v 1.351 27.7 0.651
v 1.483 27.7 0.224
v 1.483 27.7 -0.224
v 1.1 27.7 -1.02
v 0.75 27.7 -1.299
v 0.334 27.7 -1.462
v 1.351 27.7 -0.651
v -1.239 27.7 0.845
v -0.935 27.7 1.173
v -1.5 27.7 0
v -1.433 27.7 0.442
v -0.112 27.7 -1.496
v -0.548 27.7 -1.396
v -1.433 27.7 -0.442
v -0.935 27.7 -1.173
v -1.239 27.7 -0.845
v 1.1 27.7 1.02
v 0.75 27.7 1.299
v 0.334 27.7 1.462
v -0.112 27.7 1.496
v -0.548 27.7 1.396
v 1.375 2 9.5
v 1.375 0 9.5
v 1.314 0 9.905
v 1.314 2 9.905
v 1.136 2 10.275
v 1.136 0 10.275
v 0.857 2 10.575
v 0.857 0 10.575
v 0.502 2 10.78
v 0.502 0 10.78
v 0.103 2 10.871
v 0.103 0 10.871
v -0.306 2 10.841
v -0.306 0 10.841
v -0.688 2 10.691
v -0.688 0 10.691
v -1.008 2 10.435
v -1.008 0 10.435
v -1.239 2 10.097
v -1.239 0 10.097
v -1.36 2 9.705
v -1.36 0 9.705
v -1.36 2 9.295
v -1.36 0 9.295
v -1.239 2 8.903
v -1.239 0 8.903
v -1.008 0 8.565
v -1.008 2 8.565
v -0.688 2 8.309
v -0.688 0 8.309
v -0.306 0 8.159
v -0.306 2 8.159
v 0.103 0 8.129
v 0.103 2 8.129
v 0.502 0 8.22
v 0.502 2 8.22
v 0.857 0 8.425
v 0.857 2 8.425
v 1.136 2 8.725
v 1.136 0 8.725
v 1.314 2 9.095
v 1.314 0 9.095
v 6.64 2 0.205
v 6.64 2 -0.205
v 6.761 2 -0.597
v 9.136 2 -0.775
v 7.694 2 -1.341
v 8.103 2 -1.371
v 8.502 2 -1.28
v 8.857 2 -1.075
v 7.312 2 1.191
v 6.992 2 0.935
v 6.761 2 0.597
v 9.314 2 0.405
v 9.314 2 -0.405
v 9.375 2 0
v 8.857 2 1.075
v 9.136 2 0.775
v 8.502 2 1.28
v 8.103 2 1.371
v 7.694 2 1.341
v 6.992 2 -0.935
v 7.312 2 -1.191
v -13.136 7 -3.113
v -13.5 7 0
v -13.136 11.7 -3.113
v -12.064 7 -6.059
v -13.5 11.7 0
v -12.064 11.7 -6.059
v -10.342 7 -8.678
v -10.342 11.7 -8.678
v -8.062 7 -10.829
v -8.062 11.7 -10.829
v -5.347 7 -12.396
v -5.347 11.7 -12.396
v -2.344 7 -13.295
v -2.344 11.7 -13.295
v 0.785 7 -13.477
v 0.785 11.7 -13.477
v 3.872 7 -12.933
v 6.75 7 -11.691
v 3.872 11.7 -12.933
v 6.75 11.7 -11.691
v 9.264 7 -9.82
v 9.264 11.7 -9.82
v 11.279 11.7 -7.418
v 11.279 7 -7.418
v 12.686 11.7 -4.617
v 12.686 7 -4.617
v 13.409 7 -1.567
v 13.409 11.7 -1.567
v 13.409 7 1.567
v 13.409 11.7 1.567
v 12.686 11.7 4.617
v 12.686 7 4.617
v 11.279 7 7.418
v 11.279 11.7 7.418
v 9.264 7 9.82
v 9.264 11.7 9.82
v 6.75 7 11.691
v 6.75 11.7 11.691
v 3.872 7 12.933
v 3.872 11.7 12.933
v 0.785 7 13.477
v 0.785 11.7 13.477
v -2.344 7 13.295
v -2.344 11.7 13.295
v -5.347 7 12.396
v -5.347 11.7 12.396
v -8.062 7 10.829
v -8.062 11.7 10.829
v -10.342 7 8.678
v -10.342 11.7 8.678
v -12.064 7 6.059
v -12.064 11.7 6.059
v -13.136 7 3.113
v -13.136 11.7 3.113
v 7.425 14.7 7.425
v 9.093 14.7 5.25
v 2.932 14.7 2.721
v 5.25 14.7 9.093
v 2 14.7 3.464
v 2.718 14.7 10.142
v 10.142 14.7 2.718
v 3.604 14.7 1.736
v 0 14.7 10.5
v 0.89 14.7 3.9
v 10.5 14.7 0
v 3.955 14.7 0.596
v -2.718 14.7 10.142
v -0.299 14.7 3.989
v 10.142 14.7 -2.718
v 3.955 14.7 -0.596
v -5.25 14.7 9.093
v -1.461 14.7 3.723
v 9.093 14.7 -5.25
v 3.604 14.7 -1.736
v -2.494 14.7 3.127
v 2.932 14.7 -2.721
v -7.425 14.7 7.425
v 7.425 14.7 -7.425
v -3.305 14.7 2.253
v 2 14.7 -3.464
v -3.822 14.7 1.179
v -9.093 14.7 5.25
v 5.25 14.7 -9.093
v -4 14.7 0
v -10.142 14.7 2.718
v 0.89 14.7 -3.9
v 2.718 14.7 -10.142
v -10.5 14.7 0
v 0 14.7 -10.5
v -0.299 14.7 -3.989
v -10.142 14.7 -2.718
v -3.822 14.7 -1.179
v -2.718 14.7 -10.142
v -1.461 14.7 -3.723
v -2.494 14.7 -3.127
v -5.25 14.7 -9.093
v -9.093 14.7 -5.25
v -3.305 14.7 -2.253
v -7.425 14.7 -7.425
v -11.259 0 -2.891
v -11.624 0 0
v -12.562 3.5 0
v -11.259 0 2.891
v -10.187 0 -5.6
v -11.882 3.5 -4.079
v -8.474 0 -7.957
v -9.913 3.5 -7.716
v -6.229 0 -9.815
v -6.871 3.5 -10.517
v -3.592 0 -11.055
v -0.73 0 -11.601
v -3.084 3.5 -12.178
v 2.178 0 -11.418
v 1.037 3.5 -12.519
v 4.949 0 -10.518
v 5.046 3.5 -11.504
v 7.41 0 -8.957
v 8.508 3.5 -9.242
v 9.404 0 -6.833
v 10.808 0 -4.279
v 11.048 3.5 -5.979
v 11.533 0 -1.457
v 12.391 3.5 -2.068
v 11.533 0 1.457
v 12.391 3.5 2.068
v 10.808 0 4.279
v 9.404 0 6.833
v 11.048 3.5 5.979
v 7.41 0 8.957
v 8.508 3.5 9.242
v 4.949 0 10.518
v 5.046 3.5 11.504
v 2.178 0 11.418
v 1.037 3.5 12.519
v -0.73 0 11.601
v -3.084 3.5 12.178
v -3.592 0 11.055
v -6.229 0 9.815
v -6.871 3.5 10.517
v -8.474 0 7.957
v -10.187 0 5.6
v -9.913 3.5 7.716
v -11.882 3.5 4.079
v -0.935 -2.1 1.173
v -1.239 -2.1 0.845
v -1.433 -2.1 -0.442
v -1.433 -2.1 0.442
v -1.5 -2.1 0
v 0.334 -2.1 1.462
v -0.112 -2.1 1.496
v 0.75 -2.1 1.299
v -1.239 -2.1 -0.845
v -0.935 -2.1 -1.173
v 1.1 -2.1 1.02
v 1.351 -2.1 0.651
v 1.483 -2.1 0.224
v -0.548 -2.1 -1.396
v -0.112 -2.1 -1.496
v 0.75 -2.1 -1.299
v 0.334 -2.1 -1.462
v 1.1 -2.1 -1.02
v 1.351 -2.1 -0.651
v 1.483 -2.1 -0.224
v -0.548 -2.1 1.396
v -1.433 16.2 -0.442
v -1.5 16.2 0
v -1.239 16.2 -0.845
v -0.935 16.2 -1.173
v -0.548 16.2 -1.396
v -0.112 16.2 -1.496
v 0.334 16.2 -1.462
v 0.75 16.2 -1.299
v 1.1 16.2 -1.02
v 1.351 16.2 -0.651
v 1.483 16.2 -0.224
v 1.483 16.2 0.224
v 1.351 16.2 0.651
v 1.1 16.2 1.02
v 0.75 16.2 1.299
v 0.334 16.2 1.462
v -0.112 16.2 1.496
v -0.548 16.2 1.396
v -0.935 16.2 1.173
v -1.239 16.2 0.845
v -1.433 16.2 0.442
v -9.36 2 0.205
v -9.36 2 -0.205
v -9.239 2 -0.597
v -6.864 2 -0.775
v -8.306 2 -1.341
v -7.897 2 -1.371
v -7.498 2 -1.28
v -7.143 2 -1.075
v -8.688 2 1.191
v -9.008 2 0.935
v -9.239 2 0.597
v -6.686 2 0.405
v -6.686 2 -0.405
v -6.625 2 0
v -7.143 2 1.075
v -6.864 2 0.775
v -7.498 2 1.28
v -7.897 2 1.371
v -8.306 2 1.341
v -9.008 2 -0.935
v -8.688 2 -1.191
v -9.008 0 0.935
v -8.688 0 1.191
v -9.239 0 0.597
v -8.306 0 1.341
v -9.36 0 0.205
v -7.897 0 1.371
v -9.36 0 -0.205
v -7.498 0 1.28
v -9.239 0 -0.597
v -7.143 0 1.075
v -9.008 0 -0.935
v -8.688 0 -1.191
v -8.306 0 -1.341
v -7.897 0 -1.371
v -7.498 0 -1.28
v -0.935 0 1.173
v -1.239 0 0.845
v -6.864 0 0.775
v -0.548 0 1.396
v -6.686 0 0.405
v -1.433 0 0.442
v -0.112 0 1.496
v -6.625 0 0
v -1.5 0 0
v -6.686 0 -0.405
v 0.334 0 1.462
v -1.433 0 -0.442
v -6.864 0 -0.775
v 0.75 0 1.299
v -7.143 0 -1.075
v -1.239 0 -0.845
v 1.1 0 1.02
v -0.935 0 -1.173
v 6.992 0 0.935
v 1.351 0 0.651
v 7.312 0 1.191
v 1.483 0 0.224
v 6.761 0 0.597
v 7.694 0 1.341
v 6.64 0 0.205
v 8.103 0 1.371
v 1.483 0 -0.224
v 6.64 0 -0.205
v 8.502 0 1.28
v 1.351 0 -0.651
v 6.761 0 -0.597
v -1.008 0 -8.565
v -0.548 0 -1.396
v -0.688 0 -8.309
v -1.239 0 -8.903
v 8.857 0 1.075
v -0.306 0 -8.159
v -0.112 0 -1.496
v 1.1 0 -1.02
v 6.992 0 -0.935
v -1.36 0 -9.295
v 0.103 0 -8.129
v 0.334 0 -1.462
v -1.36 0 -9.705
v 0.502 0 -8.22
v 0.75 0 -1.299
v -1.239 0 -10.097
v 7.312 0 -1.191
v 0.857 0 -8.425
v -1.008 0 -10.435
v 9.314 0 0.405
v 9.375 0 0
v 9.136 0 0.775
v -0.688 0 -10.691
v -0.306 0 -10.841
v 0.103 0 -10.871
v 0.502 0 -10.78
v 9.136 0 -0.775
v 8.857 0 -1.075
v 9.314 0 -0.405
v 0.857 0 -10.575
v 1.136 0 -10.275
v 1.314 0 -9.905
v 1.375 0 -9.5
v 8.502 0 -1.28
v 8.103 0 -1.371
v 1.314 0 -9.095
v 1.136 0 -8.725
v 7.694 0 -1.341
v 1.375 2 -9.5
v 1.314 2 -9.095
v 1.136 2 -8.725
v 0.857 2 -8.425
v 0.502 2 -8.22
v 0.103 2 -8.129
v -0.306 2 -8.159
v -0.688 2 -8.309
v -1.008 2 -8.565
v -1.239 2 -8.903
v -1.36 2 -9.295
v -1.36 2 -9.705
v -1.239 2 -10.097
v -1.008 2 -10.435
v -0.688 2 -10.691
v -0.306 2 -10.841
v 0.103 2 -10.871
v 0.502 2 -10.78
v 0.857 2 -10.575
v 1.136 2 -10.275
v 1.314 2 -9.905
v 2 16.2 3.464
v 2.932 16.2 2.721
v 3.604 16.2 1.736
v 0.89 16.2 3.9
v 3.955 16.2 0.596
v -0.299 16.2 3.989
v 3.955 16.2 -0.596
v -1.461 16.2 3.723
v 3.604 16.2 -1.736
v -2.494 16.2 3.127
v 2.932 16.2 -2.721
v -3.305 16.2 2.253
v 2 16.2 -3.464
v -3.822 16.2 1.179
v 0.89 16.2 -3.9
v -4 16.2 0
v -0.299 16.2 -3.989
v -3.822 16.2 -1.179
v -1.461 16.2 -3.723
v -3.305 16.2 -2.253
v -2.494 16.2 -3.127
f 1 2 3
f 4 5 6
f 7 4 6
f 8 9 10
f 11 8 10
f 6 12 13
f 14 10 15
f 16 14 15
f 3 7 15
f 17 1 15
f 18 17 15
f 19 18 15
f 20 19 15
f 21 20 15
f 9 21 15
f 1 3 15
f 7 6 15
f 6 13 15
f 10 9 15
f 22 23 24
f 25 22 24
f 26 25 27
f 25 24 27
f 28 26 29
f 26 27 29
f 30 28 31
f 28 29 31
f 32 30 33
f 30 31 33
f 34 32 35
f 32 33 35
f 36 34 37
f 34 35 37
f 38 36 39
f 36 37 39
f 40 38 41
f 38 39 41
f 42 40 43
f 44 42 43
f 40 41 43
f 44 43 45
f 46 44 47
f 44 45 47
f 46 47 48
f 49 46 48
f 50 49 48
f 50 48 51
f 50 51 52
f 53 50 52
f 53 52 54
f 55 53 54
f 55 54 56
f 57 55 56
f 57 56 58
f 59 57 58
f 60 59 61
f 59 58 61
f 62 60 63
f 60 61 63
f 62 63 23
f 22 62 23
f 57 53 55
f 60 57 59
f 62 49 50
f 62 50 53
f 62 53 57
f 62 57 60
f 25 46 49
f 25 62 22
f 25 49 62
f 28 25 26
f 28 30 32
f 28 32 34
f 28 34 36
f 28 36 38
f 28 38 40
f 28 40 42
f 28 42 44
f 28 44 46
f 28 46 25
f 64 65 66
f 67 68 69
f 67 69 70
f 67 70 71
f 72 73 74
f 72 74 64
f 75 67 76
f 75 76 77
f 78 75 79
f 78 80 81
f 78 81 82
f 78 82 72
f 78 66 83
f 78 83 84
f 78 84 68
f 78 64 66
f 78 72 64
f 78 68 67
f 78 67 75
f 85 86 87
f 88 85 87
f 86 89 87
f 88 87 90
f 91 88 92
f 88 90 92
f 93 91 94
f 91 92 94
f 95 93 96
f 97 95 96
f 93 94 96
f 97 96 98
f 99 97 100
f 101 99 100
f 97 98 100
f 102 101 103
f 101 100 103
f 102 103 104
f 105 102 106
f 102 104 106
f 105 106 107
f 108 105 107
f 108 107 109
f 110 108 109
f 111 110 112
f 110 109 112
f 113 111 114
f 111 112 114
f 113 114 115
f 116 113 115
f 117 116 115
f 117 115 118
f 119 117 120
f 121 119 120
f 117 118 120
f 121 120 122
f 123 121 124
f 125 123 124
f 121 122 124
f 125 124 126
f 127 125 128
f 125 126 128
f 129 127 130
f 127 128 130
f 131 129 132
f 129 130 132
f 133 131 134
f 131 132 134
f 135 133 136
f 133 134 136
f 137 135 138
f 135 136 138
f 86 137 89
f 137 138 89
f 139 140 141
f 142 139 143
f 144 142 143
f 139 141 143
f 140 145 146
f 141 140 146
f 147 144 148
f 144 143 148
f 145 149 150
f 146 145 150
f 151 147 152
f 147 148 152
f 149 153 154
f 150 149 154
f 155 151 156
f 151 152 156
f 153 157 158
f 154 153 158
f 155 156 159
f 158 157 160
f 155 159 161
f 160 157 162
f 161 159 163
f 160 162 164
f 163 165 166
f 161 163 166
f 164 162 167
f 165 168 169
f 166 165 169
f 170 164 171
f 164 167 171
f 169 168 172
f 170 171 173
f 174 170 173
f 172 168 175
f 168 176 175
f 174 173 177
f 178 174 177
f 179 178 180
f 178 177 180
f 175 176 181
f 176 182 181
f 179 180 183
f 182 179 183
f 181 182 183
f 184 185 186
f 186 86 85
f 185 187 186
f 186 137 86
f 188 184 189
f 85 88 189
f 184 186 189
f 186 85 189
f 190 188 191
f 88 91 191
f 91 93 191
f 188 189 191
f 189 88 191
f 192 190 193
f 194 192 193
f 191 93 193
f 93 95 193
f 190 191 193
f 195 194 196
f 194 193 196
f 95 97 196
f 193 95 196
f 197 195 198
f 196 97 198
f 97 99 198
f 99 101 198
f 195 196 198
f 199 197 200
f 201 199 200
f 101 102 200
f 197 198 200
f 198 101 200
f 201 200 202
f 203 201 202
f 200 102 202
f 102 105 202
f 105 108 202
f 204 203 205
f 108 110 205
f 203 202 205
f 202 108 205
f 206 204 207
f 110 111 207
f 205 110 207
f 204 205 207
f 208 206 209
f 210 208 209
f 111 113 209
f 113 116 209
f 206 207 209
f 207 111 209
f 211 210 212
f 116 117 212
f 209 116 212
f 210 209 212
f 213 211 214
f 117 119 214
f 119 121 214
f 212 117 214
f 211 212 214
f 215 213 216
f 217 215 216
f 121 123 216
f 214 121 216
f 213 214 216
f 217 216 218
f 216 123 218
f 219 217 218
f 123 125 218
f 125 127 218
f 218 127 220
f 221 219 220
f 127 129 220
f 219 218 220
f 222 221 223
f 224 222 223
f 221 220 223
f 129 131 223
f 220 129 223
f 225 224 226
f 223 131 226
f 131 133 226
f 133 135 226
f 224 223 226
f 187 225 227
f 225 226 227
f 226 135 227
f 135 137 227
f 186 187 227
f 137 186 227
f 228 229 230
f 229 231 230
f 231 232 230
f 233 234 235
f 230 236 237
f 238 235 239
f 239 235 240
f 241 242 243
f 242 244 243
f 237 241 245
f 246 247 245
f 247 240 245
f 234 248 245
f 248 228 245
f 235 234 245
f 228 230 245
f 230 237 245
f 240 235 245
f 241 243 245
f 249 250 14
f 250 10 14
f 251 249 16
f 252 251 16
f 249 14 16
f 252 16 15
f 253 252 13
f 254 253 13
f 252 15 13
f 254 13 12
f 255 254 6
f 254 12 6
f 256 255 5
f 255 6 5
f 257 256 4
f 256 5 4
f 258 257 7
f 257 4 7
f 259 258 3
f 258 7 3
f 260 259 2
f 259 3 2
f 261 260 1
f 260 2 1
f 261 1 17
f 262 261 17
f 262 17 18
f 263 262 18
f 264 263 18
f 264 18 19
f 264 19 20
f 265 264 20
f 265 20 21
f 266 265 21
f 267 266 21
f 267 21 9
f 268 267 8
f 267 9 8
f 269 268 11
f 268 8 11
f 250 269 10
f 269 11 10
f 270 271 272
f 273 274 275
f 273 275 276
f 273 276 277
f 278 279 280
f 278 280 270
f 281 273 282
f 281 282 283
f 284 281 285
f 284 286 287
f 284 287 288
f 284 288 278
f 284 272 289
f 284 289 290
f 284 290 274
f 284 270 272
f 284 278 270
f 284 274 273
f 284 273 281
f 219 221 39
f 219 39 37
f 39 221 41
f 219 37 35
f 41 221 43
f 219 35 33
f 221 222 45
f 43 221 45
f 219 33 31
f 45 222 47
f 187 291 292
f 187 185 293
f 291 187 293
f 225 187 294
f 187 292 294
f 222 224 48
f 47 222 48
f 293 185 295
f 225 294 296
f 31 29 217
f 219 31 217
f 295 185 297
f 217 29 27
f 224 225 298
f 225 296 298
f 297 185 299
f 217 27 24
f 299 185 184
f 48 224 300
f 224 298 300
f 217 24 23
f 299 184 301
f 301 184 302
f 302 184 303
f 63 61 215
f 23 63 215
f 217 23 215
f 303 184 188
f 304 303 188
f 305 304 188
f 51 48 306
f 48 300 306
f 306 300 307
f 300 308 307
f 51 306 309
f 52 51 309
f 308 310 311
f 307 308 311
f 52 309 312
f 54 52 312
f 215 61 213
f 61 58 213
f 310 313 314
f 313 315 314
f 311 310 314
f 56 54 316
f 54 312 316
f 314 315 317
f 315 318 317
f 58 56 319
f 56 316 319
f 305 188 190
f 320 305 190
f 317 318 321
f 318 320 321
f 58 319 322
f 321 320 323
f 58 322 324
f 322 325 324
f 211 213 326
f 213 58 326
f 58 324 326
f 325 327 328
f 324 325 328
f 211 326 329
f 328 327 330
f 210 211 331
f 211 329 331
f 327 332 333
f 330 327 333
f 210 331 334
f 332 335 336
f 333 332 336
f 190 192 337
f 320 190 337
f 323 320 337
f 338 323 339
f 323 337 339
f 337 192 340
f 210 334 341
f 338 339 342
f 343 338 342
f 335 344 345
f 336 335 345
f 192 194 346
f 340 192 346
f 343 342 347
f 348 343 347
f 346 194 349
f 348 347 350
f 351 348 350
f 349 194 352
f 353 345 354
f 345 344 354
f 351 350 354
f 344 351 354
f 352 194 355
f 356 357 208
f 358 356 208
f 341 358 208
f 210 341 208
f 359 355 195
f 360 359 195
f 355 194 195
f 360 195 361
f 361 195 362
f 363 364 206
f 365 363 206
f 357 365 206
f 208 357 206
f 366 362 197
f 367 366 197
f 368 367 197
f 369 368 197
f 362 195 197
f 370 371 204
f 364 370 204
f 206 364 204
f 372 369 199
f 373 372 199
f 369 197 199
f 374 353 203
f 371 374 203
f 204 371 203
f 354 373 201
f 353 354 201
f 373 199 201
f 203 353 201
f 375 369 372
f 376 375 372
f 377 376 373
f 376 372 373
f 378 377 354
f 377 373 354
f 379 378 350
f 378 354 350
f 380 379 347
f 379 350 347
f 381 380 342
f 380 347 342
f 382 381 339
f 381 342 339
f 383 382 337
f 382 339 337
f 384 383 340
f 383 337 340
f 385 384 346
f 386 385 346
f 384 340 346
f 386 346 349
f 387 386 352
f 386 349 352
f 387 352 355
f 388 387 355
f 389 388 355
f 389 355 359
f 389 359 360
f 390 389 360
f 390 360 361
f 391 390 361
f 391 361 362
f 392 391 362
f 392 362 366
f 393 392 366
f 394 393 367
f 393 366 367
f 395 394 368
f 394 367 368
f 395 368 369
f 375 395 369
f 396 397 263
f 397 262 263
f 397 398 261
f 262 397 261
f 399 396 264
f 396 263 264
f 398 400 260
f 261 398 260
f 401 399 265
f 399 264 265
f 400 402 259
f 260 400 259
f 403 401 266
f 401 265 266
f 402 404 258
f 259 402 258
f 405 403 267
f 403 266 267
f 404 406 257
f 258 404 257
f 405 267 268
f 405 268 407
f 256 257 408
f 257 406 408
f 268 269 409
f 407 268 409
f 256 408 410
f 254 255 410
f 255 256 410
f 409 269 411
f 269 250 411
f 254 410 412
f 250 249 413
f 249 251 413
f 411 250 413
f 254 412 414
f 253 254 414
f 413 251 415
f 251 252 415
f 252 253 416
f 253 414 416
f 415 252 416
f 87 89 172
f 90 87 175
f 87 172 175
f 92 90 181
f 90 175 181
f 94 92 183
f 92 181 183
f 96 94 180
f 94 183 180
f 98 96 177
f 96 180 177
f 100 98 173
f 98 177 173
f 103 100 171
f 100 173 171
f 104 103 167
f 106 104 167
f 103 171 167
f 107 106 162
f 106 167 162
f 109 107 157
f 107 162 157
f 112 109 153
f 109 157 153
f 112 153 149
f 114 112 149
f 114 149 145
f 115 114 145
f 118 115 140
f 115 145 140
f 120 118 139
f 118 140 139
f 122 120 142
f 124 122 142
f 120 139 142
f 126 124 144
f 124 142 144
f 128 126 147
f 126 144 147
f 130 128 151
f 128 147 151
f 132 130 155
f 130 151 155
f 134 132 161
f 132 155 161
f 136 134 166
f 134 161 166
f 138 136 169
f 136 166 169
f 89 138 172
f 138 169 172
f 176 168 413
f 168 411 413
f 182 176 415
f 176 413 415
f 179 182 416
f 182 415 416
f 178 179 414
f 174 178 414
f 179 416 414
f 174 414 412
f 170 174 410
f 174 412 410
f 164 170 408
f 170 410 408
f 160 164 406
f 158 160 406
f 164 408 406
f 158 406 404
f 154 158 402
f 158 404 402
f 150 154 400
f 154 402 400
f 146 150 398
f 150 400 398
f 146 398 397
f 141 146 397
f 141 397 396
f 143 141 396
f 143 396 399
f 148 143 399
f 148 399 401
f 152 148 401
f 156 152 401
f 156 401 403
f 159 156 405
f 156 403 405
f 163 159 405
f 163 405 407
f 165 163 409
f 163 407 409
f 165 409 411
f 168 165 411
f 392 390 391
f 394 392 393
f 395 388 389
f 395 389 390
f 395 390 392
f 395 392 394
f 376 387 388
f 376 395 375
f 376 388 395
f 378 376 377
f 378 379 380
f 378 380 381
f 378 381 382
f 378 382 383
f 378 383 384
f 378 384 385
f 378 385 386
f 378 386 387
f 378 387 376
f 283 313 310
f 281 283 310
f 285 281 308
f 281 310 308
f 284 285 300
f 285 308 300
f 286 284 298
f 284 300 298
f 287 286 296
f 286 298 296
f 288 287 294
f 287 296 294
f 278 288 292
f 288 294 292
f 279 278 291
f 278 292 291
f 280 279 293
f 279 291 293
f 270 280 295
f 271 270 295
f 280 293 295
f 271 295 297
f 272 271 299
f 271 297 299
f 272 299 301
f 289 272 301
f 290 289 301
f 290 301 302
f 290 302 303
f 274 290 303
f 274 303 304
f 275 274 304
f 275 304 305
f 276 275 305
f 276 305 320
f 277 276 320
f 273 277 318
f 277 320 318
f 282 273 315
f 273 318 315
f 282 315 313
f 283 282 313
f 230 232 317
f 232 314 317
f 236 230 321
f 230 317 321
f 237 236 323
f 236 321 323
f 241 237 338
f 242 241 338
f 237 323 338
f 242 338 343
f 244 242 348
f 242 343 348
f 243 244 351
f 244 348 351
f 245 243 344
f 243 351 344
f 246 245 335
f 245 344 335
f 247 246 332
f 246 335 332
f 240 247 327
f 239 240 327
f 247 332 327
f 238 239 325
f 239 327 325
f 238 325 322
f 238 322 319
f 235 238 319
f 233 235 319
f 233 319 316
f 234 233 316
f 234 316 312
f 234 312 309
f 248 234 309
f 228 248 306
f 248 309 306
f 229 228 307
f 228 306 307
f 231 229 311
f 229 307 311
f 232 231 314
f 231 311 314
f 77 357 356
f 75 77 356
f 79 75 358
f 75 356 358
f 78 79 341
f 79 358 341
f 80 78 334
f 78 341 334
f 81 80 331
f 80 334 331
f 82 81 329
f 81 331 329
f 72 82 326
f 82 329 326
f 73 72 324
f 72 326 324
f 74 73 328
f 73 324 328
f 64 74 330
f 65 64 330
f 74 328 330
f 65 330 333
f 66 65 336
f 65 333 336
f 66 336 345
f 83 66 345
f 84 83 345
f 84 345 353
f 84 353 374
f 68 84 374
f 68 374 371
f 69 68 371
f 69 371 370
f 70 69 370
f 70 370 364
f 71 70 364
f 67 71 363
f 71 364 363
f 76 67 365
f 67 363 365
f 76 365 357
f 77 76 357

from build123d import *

# Parameters (mm, degrees)
SKETCH3_R          = 1.375
CUT_EXTRUDE1_DEPTH = 2


with BuildPart() as part:
    # Sketch2 → Revolve1 (revolve)
    with BuildSketch(Plane.XY, mode=Mode.PRIVATE) as revolve1_sk:
        Polygon((1.5, 0), (11.624355653, 0), (13.5, 7), (13.5, 11.7), (10.5, 14.7), (4, 14.7), (4, 16.2), (1.5, 16.2), (1.5, 27.7), (0, 27.7), (0, -2.1), (1.5, -2.1), align=None)
    revolve(revolve1_sk.sketch.rotate(Axis((0, -2.1, 0), (0, -1, 0)), 180), axis=Axis((0, -2.1, 0), (0, -1, 0)))

    # Sketch3 → Cut-Extrude1 (cut)
    with BuildSketch(Plane.XZ):
        with Locations((0, 9.5)):
            Circle(SKETCH3_R)
        with Locations((0, -9.5)):
            Circle(SKETCH3_R)
        with Locations((-8, 0)):
            Circle(SKETCH3_R)
        with Locations((8, 0)):
            Circle(SKETCH3_R)
    extrude(amount=-CUT_EXTRUDE1_DEPTH, mode=Mode.SUBTRACT)


solid = part.part
